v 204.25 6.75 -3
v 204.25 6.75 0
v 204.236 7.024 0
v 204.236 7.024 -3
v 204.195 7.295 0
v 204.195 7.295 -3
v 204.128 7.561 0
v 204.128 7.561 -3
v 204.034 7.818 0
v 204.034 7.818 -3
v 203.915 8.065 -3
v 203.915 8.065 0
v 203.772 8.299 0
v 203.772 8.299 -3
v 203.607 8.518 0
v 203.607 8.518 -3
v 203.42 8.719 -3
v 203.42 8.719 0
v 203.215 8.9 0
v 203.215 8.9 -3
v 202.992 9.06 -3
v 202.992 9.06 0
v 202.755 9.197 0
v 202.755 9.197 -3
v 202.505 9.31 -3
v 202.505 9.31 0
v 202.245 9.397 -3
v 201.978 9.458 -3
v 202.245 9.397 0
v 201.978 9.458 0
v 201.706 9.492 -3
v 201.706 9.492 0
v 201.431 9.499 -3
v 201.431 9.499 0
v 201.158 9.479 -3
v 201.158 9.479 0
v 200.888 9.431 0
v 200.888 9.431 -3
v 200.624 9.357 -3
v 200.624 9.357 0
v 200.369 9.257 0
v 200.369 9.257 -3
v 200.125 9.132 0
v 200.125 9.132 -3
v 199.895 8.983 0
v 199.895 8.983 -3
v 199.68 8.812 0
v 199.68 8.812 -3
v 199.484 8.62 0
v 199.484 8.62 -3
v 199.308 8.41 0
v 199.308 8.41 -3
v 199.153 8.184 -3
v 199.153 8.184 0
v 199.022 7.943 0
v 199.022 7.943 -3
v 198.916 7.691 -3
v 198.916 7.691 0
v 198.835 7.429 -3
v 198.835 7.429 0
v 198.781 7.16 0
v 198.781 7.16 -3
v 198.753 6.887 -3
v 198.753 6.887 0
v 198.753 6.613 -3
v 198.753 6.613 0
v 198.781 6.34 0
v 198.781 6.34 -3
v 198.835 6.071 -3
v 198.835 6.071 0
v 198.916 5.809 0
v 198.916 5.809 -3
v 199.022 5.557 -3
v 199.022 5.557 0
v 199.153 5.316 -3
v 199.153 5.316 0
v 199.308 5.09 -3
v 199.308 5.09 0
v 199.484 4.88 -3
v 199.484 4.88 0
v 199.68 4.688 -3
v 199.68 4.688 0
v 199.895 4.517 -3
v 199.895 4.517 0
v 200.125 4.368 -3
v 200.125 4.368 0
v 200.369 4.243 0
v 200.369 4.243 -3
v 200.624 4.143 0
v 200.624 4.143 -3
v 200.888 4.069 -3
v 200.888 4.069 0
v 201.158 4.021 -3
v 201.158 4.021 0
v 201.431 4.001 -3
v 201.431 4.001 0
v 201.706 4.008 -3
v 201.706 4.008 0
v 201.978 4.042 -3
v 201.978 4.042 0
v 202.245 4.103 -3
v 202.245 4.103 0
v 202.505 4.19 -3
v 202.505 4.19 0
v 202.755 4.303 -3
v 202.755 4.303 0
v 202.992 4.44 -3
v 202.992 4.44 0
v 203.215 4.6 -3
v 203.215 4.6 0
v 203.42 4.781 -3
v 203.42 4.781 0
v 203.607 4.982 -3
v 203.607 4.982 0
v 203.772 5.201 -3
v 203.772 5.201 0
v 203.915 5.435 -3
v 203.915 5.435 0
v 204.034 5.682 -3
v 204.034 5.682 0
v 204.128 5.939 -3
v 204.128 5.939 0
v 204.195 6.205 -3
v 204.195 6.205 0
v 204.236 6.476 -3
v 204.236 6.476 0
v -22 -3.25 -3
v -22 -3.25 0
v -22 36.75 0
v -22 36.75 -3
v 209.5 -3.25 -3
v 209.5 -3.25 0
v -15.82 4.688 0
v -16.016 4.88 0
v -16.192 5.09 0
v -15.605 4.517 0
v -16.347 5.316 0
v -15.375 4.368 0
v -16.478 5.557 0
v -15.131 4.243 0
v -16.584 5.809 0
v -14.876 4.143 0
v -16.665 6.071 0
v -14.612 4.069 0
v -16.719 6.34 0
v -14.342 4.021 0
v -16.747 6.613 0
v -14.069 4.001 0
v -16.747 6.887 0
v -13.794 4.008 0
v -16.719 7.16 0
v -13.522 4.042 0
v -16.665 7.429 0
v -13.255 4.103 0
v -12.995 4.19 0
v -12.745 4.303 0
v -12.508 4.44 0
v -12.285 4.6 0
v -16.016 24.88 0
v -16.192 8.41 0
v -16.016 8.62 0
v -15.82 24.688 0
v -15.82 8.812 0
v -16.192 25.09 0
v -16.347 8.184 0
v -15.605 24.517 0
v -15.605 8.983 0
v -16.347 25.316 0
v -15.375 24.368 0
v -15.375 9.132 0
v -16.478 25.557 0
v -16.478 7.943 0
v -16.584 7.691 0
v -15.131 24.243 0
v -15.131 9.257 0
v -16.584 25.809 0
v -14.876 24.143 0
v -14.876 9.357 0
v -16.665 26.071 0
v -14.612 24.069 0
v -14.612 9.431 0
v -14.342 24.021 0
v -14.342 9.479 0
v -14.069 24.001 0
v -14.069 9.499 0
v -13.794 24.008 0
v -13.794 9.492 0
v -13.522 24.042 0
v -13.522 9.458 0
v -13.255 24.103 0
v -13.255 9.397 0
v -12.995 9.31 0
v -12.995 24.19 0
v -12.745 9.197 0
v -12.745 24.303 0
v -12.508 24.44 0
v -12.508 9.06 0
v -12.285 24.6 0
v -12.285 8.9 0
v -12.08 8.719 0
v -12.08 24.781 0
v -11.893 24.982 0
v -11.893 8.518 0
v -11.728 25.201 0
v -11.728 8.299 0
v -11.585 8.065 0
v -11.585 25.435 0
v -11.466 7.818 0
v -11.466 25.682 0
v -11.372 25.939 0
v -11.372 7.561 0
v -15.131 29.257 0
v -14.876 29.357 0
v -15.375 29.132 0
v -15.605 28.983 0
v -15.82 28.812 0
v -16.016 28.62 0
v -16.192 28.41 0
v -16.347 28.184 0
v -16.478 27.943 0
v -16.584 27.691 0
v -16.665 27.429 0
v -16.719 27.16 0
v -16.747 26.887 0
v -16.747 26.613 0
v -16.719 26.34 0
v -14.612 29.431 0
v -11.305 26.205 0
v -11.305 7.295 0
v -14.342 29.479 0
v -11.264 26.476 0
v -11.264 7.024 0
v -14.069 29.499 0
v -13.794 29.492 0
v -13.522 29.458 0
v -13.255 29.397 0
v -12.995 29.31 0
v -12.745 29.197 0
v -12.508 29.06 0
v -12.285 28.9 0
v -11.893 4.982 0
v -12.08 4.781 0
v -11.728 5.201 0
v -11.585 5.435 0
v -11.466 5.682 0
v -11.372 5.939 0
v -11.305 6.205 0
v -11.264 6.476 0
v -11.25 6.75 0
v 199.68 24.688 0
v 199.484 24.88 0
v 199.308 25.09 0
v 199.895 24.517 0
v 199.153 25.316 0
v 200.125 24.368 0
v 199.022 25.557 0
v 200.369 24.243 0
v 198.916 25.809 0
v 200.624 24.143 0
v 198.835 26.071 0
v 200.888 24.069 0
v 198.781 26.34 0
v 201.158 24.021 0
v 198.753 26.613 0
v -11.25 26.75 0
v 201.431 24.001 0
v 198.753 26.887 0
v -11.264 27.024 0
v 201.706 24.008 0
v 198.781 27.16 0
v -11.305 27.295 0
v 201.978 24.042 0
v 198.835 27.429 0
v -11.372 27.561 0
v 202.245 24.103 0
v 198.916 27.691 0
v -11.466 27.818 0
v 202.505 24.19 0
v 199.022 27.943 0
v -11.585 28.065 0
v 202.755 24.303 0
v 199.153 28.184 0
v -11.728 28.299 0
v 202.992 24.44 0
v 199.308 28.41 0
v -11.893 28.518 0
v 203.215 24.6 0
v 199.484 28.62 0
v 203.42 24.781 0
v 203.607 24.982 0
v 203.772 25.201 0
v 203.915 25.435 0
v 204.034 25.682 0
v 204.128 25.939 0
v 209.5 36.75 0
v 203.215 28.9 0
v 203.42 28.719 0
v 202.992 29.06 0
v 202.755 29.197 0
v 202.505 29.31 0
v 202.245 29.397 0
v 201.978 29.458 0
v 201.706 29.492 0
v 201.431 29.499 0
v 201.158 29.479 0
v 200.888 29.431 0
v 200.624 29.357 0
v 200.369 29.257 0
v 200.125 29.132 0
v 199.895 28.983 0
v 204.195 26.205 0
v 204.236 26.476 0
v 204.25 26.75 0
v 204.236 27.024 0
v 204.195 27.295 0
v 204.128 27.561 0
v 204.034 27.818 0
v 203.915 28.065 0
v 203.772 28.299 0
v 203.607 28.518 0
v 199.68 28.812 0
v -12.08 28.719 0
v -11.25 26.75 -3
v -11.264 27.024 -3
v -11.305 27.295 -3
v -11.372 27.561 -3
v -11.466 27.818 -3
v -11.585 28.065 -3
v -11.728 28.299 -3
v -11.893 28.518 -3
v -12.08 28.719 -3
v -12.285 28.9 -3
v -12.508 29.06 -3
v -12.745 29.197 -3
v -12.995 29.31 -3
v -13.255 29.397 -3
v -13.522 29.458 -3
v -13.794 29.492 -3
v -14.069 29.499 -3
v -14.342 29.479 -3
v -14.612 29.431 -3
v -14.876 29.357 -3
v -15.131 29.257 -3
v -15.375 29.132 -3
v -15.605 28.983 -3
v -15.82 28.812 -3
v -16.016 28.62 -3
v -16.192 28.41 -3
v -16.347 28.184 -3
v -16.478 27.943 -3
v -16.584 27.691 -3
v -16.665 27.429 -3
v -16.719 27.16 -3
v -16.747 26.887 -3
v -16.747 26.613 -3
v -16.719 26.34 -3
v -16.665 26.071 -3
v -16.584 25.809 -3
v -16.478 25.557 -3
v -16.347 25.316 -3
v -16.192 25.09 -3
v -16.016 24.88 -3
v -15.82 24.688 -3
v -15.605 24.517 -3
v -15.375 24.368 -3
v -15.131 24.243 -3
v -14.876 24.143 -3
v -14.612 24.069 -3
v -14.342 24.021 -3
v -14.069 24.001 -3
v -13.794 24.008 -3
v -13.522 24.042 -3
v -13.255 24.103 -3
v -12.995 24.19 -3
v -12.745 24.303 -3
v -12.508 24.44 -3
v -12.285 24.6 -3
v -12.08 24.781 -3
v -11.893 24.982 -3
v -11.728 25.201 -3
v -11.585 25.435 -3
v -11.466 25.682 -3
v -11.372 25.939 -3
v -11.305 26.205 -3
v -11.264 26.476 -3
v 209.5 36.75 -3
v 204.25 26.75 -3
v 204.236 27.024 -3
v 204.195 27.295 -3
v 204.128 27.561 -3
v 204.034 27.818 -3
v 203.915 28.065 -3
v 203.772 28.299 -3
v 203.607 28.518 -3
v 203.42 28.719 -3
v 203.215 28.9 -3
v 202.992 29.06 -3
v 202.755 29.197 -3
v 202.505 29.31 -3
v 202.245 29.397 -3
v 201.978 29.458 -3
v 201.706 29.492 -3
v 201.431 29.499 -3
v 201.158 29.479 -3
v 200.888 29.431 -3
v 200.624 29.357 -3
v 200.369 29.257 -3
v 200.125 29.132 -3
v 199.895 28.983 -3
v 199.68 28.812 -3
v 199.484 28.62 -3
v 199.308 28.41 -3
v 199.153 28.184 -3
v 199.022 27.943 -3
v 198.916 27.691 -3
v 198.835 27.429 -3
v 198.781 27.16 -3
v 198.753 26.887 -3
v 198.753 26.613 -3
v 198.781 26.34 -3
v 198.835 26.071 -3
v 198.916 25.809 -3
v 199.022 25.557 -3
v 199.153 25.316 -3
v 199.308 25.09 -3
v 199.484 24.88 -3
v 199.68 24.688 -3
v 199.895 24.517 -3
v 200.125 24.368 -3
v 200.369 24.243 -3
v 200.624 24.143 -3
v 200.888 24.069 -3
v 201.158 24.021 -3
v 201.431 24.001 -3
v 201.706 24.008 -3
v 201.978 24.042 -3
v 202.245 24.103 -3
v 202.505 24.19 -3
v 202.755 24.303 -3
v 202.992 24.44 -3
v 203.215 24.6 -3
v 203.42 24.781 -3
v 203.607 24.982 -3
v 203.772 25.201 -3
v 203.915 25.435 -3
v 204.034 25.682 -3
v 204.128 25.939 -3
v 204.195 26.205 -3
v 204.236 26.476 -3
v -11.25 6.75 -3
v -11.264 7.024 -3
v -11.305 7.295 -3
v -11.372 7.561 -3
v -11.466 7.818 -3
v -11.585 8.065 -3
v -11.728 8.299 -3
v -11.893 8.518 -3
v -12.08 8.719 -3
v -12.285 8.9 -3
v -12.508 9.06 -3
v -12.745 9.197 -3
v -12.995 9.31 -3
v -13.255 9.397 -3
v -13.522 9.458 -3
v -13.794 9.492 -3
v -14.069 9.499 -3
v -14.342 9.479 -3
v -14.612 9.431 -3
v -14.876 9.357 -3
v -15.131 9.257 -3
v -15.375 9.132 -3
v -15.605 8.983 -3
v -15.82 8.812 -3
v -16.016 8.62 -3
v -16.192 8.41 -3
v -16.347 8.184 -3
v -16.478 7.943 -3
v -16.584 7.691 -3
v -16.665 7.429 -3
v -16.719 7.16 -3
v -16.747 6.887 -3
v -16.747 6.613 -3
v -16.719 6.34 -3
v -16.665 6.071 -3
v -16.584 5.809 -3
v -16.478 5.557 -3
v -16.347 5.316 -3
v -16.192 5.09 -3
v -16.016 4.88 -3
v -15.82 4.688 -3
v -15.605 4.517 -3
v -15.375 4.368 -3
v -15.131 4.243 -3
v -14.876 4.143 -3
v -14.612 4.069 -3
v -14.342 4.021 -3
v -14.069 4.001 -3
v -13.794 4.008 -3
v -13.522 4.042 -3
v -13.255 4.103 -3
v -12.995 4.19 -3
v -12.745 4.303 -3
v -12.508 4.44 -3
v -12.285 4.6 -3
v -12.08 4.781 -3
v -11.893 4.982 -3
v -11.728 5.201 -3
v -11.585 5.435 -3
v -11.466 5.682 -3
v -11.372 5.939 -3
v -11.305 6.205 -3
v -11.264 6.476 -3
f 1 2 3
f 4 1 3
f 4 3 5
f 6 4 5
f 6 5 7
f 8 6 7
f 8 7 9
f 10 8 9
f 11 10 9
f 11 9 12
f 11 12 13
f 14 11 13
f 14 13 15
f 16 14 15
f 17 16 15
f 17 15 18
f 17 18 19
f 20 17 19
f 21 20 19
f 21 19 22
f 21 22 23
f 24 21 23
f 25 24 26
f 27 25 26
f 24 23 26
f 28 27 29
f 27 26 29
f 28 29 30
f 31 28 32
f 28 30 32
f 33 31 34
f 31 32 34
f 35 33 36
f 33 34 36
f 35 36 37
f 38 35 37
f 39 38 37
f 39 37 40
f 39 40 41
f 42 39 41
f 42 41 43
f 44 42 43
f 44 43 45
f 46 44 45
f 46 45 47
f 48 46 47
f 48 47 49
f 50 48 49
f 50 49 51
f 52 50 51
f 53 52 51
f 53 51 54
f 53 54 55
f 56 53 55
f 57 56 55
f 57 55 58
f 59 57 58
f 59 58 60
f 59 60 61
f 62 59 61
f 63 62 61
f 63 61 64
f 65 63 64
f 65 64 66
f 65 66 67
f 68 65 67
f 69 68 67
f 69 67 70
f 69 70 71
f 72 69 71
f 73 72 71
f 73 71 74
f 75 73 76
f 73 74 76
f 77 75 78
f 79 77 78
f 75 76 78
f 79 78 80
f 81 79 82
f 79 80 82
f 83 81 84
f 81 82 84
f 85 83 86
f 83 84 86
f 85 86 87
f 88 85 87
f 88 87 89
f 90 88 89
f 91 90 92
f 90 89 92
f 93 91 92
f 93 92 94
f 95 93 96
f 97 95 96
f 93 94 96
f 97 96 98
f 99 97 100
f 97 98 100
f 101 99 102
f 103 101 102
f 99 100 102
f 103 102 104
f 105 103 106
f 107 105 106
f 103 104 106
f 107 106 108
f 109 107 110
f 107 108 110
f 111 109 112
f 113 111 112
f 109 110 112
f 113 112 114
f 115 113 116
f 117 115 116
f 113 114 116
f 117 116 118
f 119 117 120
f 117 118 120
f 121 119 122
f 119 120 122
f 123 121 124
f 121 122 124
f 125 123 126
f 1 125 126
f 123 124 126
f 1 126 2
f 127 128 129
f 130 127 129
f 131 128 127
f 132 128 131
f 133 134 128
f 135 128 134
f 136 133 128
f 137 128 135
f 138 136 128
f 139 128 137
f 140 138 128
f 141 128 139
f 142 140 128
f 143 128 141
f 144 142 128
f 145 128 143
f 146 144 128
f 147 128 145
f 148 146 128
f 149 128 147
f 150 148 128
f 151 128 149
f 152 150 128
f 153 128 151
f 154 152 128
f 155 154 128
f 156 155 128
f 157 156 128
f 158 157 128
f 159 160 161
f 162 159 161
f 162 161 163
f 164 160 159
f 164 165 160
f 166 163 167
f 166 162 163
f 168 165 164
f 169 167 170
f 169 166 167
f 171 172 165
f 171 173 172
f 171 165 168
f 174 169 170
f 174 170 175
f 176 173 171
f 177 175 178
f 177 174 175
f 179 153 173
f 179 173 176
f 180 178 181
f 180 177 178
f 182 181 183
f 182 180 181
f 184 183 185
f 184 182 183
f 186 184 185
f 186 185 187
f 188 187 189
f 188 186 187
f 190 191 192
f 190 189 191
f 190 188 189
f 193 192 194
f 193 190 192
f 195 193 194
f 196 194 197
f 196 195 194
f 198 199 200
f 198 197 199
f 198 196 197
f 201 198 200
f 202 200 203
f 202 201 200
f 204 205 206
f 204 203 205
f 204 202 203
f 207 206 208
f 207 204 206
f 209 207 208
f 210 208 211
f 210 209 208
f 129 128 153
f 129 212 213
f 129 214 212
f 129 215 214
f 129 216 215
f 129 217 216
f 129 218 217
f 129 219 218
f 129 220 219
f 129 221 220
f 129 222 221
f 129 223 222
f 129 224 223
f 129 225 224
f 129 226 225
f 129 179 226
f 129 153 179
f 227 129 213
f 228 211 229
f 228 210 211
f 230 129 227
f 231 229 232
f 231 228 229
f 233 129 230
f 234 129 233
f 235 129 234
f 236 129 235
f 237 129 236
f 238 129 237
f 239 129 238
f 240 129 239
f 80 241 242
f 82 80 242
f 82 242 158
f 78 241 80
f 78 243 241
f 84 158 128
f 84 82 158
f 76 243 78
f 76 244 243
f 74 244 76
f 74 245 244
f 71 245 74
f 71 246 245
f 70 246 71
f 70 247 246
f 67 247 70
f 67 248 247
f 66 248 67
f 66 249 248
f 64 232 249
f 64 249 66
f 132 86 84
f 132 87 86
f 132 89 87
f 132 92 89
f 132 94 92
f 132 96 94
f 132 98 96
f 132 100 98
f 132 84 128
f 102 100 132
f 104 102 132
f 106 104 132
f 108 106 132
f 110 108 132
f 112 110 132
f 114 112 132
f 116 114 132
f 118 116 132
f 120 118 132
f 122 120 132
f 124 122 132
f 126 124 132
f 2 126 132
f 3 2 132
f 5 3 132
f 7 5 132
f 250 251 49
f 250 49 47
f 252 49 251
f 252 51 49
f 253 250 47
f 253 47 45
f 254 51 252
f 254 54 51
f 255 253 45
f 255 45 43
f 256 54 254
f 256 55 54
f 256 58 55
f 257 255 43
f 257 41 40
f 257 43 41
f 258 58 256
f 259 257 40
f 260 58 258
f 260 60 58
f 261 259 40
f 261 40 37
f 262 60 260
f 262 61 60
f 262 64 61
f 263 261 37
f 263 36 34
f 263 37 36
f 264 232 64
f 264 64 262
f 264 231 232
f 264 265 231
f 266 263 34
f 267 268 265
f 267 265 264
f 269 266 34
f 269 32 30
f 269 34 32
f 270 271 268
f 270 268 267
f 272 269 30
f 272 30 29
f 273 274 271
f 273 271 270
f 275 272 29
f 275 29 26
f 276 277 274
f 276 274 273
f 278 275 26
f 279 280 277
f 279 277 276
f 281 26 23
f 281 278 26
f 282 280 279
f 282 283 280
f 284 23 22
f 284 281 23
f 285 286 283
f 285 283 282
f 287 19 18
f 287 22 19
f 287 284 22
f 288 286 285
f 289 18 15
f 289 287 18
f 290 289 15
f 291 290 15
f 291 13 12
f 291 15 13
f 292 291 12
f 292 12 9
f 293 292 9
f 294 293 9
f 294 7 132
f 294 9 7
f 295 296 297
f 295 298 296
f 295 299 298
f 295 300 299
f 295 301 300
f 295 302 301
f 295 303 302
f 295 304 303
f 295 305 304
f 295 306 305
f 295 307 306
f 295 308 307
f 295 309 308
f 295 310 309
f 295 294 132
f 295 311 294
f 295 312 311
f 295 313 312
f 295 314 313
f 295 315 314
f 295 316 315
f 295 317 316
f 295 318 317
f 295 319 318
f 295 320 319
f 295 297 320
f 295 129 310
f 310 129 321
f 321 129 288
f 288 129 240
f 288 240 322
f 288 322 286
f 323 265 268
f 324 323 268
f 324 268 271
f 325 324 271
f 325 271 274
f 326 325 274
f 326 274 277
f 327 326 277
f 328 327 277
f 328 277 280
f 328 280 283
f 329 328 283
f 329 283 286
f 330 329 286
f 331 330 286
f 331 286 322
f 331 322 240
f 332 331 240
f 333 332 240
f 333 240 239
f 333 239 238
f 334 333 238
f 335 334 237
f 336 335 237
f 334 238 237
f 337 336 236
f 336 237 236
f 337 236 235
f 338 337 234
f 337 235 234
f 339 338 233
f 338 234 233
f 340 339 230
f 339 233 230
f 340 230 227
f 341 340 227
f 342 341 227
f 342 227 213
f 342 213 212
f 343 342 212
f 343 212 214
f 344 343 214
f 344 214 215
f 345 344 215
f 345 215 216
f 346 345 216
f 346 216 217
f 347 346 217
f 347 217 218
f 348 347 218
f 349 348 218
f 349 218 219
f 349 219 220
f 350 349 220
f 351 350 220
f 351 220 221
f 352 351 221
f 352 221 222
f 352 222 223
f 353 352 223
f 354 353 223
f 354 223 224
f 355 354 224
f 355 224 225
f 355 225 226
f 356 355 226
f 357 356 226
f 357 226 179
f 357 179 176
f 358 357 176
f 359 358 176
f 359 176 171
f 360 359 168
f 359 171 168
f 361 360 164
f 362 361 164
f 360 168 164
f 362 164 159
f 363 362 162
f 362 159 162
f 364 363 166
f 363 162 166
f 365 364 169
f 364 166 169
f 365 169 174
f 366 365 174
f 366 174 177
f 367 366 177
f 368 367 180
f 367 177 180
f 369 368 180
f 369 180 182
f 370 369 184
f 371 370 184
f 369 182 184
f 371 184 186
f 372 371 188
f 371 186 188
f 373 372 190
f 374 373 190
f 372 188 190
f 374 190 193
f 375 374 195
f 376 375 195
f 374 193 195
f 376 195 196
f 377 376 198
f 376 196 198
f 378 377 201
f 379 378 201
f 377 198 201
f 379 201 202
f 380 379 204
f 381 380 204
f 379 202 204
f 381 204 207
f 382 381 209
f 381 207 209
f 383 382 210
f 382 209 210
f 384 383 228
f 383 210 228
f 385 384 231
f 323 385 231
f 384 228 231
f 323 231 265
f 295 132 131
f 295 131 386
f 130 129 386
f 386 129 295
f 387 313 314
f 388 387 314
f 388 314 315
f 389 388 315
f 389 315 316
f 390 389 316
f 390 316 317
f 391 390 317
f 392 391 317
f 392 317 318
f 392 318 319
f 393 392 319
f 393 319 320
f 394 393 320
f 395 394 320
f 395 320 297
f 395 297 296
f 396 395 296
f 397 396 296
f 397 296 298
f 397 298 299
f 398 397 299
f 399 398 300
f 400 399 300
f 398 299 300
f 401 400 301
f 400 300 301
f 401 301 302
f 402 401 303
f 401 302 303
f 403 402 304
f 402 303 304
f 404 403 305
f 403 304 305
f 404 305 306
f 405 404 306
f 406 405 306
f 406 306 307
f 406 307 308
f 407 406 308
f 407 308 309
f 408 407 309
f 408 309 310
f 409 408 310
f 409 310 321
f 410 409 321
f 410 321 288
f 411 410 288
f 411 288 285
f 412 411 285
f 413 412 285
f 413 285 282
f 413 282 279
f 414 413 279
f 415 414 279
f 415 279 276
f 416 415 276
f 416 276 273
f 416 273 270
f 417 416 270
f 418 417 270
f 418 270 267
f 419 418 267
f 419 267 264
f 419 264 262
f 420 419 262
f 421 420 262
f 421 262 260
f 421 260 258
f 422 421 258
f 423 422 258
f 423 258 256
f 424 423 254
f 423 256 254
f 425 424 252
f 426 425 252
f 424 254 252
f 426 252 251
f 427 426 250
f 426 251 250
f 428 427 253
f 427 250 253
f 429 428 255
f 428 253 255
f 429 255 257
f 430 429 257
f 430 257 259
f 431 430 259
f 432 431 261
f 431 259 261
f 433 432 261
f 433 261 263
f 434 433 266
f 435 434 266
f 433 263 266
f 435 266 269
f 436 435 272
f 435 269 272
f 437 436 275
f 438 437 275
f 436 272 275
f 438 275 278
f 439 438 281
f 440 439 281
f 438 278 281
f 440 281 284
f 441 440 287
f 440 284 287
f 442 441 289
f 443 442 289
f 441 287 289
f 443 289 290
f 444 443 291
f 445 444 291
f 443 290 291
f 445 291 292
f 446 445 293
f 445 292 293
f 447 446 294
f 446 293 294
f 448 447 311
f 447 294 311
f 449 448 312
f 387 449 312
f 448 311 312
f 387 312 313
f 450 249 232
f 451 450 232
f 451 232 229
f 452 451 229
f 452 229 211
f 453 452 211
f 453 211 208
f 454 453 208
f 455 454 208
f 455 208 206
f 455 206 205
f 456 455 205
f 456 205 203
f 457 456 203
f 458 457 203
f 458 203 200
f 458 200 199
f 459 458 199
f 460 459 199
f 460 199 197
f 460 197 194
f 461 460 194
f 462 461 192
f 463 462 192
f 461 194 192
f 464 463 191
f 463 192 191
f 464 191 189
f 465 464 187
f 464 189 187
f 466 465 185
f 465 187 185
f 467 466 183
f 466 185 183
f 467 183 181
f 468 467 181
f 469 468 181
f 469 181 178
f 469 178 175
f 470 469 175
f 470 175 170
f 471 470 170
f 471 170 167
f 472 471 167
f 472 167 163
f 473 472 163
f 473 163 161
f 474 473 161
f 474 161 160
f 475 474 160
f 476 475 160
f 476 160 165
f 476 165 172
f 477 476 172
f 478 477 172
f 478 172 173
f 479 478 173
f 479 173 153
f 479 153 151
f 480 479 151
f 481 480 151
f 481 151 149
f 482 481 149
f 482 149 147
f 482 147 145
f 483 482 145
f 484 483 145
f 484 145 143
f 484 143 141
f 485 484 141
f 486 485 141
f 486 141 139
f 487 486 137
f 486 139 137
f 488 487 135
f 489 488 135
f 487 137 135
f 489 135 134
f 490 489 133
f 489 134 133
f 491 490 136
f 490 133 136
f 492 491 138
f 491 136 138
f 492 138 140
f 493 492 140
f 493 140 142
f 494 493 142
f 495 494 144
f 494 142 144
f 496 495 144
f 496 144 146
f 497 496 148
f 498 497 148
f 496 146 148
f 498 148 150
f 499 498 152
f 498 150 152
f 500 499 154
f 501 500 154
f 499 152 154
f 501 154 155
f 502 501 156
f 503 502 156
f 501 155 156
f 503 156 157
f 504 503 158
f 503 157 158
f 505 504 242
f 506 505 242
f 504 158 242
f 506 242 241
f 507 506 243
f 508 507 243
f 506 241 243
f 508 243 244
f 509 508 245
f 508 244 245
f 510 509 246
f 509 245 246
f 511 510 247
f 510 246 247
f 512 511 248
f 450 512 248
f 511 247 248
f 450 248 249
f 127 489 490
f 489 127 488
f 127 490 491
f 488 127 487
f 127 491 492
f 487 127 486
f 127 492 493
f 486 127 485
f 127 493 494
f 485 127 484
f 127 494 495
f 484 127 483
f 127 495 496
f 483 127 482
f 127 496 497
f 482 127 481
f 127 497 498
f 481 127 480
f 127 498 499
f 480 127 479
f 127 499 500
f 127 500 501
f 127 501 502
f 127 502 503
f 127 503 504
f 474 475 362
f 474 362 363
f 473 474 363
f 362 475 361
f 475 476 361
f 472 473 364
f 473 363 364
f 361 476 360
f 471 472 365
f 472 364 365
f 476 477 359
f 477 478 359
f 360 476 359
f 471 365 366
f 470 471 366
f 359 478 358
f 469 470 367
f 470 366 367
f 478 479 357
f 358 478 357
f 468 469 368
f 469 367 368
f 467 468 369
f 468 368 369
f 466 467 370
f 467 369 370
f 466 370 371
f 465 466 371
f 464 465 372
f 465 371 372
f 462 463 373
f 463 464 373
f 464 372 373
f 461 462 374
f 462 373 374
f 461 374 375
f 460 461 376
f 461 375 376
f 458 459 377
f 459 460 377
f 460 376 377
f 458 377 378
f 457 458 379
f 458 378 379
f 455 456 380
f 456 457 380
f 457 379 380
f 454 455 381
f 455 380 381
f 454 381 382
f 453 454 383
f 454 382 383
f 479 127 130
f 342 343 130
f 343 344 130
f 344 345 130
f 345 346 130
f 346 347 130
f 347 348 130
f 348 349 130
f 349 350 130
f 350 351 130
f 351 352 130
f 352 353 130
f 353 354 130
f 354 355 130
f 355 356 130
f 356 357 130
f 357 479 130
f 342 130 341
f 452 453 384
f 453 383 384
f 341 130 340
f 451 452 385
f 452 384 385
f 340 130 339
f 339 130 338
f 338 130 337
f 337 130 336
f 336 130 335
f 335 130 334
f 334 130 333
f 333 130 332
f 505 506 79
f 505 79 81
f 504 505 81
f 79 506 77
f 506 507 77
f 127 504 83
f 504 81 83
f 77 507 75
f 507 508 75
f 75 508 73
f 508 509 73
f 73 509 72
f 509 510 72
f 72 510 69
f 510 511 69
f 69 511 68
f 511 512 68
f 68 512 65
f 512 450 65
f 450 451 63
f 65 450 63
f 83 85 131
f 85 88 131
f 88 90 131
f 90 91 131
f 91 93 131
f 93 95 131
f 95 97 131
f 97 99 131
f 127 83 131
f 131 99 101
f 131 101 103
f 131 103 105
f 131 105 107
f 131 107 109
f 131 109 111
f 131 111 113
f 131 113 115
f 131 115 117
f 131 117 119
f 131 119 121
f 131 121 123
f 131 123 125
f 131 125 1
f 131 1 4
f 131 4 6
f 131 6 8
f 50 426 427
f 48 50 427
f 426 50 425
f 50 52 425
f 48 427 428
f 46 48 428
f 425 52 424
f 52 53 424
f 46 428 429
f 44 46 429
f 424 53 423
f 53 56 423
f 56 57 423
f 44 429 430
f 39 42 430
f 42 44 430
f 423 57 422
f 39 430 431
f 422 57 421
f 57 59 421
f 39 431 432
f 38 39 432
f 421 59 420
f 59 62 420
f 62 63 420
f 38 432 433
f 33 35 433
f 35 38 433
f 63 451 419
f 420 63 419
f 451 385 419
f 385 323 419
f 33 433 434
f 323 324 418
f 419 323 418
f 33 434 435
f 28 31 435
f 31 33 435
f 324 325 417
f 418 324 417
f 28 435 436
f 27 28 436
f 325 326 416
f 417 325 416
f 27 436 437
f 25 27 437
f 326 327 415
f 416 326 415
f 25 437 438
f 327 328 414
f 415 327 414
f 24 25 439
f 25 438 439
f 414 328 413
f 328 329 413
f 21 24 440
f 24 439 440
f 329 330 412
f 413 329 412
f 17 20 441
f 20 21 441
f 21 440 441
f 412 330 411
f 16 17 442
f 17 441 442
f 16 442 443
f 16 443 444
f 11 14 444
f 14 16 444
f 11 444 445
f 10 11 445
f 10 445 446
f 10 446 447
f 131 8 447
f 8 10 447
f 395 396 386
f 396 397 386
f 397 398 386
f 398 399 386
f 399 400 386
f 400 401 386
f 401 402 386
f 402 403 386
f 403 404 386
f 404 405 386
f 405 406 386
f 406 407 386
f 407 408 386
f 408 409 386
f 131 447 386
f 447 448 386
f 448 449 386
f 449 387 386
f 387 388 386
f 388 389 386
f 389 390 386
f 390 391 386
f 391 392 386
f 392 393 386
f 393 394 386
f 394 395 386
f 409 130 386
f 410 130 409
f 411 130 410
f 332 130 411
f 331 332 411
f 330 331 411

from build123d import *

# Parameters (mm, degrees)
EXTRUSION_BASE_SKETCH_W      = 231.5
EXTRUSION_BASE_SKETCH_H      = 40
EXTRUSION_BASE_EXTRUDE_DEPTH = 3
M5_MOUNTING_HOLES_D          = 5.5


with BuildPart() as part:
    # Extrusion Base Sketch → Extrusion Base Extrude (new body)
    with BuildSketch(Plane.XY):
        with Locations((93.75, 16.75)):
            Rectangle(EXTRUSION_BASE_SKETCH_W, EXTRUSION_BASE_SKETCH_H)
    extrude(amount=-EXTRUSION_BASE_EXTRUDE_DEPTH)

    # M5 Mounting Holes (through all)
    with Locations(Plane(origin=(0, 0, -3), x_dir=(-1, 0, 0), z_dir=(0, 0, -1))):
        with Locations((-201.5, 26.75), (-201.5, 6.75), (14, 26.75), (14, 6.75)):
            Hole(M5_MOUNTING_HOLES_D / 2)


solid = part.part
